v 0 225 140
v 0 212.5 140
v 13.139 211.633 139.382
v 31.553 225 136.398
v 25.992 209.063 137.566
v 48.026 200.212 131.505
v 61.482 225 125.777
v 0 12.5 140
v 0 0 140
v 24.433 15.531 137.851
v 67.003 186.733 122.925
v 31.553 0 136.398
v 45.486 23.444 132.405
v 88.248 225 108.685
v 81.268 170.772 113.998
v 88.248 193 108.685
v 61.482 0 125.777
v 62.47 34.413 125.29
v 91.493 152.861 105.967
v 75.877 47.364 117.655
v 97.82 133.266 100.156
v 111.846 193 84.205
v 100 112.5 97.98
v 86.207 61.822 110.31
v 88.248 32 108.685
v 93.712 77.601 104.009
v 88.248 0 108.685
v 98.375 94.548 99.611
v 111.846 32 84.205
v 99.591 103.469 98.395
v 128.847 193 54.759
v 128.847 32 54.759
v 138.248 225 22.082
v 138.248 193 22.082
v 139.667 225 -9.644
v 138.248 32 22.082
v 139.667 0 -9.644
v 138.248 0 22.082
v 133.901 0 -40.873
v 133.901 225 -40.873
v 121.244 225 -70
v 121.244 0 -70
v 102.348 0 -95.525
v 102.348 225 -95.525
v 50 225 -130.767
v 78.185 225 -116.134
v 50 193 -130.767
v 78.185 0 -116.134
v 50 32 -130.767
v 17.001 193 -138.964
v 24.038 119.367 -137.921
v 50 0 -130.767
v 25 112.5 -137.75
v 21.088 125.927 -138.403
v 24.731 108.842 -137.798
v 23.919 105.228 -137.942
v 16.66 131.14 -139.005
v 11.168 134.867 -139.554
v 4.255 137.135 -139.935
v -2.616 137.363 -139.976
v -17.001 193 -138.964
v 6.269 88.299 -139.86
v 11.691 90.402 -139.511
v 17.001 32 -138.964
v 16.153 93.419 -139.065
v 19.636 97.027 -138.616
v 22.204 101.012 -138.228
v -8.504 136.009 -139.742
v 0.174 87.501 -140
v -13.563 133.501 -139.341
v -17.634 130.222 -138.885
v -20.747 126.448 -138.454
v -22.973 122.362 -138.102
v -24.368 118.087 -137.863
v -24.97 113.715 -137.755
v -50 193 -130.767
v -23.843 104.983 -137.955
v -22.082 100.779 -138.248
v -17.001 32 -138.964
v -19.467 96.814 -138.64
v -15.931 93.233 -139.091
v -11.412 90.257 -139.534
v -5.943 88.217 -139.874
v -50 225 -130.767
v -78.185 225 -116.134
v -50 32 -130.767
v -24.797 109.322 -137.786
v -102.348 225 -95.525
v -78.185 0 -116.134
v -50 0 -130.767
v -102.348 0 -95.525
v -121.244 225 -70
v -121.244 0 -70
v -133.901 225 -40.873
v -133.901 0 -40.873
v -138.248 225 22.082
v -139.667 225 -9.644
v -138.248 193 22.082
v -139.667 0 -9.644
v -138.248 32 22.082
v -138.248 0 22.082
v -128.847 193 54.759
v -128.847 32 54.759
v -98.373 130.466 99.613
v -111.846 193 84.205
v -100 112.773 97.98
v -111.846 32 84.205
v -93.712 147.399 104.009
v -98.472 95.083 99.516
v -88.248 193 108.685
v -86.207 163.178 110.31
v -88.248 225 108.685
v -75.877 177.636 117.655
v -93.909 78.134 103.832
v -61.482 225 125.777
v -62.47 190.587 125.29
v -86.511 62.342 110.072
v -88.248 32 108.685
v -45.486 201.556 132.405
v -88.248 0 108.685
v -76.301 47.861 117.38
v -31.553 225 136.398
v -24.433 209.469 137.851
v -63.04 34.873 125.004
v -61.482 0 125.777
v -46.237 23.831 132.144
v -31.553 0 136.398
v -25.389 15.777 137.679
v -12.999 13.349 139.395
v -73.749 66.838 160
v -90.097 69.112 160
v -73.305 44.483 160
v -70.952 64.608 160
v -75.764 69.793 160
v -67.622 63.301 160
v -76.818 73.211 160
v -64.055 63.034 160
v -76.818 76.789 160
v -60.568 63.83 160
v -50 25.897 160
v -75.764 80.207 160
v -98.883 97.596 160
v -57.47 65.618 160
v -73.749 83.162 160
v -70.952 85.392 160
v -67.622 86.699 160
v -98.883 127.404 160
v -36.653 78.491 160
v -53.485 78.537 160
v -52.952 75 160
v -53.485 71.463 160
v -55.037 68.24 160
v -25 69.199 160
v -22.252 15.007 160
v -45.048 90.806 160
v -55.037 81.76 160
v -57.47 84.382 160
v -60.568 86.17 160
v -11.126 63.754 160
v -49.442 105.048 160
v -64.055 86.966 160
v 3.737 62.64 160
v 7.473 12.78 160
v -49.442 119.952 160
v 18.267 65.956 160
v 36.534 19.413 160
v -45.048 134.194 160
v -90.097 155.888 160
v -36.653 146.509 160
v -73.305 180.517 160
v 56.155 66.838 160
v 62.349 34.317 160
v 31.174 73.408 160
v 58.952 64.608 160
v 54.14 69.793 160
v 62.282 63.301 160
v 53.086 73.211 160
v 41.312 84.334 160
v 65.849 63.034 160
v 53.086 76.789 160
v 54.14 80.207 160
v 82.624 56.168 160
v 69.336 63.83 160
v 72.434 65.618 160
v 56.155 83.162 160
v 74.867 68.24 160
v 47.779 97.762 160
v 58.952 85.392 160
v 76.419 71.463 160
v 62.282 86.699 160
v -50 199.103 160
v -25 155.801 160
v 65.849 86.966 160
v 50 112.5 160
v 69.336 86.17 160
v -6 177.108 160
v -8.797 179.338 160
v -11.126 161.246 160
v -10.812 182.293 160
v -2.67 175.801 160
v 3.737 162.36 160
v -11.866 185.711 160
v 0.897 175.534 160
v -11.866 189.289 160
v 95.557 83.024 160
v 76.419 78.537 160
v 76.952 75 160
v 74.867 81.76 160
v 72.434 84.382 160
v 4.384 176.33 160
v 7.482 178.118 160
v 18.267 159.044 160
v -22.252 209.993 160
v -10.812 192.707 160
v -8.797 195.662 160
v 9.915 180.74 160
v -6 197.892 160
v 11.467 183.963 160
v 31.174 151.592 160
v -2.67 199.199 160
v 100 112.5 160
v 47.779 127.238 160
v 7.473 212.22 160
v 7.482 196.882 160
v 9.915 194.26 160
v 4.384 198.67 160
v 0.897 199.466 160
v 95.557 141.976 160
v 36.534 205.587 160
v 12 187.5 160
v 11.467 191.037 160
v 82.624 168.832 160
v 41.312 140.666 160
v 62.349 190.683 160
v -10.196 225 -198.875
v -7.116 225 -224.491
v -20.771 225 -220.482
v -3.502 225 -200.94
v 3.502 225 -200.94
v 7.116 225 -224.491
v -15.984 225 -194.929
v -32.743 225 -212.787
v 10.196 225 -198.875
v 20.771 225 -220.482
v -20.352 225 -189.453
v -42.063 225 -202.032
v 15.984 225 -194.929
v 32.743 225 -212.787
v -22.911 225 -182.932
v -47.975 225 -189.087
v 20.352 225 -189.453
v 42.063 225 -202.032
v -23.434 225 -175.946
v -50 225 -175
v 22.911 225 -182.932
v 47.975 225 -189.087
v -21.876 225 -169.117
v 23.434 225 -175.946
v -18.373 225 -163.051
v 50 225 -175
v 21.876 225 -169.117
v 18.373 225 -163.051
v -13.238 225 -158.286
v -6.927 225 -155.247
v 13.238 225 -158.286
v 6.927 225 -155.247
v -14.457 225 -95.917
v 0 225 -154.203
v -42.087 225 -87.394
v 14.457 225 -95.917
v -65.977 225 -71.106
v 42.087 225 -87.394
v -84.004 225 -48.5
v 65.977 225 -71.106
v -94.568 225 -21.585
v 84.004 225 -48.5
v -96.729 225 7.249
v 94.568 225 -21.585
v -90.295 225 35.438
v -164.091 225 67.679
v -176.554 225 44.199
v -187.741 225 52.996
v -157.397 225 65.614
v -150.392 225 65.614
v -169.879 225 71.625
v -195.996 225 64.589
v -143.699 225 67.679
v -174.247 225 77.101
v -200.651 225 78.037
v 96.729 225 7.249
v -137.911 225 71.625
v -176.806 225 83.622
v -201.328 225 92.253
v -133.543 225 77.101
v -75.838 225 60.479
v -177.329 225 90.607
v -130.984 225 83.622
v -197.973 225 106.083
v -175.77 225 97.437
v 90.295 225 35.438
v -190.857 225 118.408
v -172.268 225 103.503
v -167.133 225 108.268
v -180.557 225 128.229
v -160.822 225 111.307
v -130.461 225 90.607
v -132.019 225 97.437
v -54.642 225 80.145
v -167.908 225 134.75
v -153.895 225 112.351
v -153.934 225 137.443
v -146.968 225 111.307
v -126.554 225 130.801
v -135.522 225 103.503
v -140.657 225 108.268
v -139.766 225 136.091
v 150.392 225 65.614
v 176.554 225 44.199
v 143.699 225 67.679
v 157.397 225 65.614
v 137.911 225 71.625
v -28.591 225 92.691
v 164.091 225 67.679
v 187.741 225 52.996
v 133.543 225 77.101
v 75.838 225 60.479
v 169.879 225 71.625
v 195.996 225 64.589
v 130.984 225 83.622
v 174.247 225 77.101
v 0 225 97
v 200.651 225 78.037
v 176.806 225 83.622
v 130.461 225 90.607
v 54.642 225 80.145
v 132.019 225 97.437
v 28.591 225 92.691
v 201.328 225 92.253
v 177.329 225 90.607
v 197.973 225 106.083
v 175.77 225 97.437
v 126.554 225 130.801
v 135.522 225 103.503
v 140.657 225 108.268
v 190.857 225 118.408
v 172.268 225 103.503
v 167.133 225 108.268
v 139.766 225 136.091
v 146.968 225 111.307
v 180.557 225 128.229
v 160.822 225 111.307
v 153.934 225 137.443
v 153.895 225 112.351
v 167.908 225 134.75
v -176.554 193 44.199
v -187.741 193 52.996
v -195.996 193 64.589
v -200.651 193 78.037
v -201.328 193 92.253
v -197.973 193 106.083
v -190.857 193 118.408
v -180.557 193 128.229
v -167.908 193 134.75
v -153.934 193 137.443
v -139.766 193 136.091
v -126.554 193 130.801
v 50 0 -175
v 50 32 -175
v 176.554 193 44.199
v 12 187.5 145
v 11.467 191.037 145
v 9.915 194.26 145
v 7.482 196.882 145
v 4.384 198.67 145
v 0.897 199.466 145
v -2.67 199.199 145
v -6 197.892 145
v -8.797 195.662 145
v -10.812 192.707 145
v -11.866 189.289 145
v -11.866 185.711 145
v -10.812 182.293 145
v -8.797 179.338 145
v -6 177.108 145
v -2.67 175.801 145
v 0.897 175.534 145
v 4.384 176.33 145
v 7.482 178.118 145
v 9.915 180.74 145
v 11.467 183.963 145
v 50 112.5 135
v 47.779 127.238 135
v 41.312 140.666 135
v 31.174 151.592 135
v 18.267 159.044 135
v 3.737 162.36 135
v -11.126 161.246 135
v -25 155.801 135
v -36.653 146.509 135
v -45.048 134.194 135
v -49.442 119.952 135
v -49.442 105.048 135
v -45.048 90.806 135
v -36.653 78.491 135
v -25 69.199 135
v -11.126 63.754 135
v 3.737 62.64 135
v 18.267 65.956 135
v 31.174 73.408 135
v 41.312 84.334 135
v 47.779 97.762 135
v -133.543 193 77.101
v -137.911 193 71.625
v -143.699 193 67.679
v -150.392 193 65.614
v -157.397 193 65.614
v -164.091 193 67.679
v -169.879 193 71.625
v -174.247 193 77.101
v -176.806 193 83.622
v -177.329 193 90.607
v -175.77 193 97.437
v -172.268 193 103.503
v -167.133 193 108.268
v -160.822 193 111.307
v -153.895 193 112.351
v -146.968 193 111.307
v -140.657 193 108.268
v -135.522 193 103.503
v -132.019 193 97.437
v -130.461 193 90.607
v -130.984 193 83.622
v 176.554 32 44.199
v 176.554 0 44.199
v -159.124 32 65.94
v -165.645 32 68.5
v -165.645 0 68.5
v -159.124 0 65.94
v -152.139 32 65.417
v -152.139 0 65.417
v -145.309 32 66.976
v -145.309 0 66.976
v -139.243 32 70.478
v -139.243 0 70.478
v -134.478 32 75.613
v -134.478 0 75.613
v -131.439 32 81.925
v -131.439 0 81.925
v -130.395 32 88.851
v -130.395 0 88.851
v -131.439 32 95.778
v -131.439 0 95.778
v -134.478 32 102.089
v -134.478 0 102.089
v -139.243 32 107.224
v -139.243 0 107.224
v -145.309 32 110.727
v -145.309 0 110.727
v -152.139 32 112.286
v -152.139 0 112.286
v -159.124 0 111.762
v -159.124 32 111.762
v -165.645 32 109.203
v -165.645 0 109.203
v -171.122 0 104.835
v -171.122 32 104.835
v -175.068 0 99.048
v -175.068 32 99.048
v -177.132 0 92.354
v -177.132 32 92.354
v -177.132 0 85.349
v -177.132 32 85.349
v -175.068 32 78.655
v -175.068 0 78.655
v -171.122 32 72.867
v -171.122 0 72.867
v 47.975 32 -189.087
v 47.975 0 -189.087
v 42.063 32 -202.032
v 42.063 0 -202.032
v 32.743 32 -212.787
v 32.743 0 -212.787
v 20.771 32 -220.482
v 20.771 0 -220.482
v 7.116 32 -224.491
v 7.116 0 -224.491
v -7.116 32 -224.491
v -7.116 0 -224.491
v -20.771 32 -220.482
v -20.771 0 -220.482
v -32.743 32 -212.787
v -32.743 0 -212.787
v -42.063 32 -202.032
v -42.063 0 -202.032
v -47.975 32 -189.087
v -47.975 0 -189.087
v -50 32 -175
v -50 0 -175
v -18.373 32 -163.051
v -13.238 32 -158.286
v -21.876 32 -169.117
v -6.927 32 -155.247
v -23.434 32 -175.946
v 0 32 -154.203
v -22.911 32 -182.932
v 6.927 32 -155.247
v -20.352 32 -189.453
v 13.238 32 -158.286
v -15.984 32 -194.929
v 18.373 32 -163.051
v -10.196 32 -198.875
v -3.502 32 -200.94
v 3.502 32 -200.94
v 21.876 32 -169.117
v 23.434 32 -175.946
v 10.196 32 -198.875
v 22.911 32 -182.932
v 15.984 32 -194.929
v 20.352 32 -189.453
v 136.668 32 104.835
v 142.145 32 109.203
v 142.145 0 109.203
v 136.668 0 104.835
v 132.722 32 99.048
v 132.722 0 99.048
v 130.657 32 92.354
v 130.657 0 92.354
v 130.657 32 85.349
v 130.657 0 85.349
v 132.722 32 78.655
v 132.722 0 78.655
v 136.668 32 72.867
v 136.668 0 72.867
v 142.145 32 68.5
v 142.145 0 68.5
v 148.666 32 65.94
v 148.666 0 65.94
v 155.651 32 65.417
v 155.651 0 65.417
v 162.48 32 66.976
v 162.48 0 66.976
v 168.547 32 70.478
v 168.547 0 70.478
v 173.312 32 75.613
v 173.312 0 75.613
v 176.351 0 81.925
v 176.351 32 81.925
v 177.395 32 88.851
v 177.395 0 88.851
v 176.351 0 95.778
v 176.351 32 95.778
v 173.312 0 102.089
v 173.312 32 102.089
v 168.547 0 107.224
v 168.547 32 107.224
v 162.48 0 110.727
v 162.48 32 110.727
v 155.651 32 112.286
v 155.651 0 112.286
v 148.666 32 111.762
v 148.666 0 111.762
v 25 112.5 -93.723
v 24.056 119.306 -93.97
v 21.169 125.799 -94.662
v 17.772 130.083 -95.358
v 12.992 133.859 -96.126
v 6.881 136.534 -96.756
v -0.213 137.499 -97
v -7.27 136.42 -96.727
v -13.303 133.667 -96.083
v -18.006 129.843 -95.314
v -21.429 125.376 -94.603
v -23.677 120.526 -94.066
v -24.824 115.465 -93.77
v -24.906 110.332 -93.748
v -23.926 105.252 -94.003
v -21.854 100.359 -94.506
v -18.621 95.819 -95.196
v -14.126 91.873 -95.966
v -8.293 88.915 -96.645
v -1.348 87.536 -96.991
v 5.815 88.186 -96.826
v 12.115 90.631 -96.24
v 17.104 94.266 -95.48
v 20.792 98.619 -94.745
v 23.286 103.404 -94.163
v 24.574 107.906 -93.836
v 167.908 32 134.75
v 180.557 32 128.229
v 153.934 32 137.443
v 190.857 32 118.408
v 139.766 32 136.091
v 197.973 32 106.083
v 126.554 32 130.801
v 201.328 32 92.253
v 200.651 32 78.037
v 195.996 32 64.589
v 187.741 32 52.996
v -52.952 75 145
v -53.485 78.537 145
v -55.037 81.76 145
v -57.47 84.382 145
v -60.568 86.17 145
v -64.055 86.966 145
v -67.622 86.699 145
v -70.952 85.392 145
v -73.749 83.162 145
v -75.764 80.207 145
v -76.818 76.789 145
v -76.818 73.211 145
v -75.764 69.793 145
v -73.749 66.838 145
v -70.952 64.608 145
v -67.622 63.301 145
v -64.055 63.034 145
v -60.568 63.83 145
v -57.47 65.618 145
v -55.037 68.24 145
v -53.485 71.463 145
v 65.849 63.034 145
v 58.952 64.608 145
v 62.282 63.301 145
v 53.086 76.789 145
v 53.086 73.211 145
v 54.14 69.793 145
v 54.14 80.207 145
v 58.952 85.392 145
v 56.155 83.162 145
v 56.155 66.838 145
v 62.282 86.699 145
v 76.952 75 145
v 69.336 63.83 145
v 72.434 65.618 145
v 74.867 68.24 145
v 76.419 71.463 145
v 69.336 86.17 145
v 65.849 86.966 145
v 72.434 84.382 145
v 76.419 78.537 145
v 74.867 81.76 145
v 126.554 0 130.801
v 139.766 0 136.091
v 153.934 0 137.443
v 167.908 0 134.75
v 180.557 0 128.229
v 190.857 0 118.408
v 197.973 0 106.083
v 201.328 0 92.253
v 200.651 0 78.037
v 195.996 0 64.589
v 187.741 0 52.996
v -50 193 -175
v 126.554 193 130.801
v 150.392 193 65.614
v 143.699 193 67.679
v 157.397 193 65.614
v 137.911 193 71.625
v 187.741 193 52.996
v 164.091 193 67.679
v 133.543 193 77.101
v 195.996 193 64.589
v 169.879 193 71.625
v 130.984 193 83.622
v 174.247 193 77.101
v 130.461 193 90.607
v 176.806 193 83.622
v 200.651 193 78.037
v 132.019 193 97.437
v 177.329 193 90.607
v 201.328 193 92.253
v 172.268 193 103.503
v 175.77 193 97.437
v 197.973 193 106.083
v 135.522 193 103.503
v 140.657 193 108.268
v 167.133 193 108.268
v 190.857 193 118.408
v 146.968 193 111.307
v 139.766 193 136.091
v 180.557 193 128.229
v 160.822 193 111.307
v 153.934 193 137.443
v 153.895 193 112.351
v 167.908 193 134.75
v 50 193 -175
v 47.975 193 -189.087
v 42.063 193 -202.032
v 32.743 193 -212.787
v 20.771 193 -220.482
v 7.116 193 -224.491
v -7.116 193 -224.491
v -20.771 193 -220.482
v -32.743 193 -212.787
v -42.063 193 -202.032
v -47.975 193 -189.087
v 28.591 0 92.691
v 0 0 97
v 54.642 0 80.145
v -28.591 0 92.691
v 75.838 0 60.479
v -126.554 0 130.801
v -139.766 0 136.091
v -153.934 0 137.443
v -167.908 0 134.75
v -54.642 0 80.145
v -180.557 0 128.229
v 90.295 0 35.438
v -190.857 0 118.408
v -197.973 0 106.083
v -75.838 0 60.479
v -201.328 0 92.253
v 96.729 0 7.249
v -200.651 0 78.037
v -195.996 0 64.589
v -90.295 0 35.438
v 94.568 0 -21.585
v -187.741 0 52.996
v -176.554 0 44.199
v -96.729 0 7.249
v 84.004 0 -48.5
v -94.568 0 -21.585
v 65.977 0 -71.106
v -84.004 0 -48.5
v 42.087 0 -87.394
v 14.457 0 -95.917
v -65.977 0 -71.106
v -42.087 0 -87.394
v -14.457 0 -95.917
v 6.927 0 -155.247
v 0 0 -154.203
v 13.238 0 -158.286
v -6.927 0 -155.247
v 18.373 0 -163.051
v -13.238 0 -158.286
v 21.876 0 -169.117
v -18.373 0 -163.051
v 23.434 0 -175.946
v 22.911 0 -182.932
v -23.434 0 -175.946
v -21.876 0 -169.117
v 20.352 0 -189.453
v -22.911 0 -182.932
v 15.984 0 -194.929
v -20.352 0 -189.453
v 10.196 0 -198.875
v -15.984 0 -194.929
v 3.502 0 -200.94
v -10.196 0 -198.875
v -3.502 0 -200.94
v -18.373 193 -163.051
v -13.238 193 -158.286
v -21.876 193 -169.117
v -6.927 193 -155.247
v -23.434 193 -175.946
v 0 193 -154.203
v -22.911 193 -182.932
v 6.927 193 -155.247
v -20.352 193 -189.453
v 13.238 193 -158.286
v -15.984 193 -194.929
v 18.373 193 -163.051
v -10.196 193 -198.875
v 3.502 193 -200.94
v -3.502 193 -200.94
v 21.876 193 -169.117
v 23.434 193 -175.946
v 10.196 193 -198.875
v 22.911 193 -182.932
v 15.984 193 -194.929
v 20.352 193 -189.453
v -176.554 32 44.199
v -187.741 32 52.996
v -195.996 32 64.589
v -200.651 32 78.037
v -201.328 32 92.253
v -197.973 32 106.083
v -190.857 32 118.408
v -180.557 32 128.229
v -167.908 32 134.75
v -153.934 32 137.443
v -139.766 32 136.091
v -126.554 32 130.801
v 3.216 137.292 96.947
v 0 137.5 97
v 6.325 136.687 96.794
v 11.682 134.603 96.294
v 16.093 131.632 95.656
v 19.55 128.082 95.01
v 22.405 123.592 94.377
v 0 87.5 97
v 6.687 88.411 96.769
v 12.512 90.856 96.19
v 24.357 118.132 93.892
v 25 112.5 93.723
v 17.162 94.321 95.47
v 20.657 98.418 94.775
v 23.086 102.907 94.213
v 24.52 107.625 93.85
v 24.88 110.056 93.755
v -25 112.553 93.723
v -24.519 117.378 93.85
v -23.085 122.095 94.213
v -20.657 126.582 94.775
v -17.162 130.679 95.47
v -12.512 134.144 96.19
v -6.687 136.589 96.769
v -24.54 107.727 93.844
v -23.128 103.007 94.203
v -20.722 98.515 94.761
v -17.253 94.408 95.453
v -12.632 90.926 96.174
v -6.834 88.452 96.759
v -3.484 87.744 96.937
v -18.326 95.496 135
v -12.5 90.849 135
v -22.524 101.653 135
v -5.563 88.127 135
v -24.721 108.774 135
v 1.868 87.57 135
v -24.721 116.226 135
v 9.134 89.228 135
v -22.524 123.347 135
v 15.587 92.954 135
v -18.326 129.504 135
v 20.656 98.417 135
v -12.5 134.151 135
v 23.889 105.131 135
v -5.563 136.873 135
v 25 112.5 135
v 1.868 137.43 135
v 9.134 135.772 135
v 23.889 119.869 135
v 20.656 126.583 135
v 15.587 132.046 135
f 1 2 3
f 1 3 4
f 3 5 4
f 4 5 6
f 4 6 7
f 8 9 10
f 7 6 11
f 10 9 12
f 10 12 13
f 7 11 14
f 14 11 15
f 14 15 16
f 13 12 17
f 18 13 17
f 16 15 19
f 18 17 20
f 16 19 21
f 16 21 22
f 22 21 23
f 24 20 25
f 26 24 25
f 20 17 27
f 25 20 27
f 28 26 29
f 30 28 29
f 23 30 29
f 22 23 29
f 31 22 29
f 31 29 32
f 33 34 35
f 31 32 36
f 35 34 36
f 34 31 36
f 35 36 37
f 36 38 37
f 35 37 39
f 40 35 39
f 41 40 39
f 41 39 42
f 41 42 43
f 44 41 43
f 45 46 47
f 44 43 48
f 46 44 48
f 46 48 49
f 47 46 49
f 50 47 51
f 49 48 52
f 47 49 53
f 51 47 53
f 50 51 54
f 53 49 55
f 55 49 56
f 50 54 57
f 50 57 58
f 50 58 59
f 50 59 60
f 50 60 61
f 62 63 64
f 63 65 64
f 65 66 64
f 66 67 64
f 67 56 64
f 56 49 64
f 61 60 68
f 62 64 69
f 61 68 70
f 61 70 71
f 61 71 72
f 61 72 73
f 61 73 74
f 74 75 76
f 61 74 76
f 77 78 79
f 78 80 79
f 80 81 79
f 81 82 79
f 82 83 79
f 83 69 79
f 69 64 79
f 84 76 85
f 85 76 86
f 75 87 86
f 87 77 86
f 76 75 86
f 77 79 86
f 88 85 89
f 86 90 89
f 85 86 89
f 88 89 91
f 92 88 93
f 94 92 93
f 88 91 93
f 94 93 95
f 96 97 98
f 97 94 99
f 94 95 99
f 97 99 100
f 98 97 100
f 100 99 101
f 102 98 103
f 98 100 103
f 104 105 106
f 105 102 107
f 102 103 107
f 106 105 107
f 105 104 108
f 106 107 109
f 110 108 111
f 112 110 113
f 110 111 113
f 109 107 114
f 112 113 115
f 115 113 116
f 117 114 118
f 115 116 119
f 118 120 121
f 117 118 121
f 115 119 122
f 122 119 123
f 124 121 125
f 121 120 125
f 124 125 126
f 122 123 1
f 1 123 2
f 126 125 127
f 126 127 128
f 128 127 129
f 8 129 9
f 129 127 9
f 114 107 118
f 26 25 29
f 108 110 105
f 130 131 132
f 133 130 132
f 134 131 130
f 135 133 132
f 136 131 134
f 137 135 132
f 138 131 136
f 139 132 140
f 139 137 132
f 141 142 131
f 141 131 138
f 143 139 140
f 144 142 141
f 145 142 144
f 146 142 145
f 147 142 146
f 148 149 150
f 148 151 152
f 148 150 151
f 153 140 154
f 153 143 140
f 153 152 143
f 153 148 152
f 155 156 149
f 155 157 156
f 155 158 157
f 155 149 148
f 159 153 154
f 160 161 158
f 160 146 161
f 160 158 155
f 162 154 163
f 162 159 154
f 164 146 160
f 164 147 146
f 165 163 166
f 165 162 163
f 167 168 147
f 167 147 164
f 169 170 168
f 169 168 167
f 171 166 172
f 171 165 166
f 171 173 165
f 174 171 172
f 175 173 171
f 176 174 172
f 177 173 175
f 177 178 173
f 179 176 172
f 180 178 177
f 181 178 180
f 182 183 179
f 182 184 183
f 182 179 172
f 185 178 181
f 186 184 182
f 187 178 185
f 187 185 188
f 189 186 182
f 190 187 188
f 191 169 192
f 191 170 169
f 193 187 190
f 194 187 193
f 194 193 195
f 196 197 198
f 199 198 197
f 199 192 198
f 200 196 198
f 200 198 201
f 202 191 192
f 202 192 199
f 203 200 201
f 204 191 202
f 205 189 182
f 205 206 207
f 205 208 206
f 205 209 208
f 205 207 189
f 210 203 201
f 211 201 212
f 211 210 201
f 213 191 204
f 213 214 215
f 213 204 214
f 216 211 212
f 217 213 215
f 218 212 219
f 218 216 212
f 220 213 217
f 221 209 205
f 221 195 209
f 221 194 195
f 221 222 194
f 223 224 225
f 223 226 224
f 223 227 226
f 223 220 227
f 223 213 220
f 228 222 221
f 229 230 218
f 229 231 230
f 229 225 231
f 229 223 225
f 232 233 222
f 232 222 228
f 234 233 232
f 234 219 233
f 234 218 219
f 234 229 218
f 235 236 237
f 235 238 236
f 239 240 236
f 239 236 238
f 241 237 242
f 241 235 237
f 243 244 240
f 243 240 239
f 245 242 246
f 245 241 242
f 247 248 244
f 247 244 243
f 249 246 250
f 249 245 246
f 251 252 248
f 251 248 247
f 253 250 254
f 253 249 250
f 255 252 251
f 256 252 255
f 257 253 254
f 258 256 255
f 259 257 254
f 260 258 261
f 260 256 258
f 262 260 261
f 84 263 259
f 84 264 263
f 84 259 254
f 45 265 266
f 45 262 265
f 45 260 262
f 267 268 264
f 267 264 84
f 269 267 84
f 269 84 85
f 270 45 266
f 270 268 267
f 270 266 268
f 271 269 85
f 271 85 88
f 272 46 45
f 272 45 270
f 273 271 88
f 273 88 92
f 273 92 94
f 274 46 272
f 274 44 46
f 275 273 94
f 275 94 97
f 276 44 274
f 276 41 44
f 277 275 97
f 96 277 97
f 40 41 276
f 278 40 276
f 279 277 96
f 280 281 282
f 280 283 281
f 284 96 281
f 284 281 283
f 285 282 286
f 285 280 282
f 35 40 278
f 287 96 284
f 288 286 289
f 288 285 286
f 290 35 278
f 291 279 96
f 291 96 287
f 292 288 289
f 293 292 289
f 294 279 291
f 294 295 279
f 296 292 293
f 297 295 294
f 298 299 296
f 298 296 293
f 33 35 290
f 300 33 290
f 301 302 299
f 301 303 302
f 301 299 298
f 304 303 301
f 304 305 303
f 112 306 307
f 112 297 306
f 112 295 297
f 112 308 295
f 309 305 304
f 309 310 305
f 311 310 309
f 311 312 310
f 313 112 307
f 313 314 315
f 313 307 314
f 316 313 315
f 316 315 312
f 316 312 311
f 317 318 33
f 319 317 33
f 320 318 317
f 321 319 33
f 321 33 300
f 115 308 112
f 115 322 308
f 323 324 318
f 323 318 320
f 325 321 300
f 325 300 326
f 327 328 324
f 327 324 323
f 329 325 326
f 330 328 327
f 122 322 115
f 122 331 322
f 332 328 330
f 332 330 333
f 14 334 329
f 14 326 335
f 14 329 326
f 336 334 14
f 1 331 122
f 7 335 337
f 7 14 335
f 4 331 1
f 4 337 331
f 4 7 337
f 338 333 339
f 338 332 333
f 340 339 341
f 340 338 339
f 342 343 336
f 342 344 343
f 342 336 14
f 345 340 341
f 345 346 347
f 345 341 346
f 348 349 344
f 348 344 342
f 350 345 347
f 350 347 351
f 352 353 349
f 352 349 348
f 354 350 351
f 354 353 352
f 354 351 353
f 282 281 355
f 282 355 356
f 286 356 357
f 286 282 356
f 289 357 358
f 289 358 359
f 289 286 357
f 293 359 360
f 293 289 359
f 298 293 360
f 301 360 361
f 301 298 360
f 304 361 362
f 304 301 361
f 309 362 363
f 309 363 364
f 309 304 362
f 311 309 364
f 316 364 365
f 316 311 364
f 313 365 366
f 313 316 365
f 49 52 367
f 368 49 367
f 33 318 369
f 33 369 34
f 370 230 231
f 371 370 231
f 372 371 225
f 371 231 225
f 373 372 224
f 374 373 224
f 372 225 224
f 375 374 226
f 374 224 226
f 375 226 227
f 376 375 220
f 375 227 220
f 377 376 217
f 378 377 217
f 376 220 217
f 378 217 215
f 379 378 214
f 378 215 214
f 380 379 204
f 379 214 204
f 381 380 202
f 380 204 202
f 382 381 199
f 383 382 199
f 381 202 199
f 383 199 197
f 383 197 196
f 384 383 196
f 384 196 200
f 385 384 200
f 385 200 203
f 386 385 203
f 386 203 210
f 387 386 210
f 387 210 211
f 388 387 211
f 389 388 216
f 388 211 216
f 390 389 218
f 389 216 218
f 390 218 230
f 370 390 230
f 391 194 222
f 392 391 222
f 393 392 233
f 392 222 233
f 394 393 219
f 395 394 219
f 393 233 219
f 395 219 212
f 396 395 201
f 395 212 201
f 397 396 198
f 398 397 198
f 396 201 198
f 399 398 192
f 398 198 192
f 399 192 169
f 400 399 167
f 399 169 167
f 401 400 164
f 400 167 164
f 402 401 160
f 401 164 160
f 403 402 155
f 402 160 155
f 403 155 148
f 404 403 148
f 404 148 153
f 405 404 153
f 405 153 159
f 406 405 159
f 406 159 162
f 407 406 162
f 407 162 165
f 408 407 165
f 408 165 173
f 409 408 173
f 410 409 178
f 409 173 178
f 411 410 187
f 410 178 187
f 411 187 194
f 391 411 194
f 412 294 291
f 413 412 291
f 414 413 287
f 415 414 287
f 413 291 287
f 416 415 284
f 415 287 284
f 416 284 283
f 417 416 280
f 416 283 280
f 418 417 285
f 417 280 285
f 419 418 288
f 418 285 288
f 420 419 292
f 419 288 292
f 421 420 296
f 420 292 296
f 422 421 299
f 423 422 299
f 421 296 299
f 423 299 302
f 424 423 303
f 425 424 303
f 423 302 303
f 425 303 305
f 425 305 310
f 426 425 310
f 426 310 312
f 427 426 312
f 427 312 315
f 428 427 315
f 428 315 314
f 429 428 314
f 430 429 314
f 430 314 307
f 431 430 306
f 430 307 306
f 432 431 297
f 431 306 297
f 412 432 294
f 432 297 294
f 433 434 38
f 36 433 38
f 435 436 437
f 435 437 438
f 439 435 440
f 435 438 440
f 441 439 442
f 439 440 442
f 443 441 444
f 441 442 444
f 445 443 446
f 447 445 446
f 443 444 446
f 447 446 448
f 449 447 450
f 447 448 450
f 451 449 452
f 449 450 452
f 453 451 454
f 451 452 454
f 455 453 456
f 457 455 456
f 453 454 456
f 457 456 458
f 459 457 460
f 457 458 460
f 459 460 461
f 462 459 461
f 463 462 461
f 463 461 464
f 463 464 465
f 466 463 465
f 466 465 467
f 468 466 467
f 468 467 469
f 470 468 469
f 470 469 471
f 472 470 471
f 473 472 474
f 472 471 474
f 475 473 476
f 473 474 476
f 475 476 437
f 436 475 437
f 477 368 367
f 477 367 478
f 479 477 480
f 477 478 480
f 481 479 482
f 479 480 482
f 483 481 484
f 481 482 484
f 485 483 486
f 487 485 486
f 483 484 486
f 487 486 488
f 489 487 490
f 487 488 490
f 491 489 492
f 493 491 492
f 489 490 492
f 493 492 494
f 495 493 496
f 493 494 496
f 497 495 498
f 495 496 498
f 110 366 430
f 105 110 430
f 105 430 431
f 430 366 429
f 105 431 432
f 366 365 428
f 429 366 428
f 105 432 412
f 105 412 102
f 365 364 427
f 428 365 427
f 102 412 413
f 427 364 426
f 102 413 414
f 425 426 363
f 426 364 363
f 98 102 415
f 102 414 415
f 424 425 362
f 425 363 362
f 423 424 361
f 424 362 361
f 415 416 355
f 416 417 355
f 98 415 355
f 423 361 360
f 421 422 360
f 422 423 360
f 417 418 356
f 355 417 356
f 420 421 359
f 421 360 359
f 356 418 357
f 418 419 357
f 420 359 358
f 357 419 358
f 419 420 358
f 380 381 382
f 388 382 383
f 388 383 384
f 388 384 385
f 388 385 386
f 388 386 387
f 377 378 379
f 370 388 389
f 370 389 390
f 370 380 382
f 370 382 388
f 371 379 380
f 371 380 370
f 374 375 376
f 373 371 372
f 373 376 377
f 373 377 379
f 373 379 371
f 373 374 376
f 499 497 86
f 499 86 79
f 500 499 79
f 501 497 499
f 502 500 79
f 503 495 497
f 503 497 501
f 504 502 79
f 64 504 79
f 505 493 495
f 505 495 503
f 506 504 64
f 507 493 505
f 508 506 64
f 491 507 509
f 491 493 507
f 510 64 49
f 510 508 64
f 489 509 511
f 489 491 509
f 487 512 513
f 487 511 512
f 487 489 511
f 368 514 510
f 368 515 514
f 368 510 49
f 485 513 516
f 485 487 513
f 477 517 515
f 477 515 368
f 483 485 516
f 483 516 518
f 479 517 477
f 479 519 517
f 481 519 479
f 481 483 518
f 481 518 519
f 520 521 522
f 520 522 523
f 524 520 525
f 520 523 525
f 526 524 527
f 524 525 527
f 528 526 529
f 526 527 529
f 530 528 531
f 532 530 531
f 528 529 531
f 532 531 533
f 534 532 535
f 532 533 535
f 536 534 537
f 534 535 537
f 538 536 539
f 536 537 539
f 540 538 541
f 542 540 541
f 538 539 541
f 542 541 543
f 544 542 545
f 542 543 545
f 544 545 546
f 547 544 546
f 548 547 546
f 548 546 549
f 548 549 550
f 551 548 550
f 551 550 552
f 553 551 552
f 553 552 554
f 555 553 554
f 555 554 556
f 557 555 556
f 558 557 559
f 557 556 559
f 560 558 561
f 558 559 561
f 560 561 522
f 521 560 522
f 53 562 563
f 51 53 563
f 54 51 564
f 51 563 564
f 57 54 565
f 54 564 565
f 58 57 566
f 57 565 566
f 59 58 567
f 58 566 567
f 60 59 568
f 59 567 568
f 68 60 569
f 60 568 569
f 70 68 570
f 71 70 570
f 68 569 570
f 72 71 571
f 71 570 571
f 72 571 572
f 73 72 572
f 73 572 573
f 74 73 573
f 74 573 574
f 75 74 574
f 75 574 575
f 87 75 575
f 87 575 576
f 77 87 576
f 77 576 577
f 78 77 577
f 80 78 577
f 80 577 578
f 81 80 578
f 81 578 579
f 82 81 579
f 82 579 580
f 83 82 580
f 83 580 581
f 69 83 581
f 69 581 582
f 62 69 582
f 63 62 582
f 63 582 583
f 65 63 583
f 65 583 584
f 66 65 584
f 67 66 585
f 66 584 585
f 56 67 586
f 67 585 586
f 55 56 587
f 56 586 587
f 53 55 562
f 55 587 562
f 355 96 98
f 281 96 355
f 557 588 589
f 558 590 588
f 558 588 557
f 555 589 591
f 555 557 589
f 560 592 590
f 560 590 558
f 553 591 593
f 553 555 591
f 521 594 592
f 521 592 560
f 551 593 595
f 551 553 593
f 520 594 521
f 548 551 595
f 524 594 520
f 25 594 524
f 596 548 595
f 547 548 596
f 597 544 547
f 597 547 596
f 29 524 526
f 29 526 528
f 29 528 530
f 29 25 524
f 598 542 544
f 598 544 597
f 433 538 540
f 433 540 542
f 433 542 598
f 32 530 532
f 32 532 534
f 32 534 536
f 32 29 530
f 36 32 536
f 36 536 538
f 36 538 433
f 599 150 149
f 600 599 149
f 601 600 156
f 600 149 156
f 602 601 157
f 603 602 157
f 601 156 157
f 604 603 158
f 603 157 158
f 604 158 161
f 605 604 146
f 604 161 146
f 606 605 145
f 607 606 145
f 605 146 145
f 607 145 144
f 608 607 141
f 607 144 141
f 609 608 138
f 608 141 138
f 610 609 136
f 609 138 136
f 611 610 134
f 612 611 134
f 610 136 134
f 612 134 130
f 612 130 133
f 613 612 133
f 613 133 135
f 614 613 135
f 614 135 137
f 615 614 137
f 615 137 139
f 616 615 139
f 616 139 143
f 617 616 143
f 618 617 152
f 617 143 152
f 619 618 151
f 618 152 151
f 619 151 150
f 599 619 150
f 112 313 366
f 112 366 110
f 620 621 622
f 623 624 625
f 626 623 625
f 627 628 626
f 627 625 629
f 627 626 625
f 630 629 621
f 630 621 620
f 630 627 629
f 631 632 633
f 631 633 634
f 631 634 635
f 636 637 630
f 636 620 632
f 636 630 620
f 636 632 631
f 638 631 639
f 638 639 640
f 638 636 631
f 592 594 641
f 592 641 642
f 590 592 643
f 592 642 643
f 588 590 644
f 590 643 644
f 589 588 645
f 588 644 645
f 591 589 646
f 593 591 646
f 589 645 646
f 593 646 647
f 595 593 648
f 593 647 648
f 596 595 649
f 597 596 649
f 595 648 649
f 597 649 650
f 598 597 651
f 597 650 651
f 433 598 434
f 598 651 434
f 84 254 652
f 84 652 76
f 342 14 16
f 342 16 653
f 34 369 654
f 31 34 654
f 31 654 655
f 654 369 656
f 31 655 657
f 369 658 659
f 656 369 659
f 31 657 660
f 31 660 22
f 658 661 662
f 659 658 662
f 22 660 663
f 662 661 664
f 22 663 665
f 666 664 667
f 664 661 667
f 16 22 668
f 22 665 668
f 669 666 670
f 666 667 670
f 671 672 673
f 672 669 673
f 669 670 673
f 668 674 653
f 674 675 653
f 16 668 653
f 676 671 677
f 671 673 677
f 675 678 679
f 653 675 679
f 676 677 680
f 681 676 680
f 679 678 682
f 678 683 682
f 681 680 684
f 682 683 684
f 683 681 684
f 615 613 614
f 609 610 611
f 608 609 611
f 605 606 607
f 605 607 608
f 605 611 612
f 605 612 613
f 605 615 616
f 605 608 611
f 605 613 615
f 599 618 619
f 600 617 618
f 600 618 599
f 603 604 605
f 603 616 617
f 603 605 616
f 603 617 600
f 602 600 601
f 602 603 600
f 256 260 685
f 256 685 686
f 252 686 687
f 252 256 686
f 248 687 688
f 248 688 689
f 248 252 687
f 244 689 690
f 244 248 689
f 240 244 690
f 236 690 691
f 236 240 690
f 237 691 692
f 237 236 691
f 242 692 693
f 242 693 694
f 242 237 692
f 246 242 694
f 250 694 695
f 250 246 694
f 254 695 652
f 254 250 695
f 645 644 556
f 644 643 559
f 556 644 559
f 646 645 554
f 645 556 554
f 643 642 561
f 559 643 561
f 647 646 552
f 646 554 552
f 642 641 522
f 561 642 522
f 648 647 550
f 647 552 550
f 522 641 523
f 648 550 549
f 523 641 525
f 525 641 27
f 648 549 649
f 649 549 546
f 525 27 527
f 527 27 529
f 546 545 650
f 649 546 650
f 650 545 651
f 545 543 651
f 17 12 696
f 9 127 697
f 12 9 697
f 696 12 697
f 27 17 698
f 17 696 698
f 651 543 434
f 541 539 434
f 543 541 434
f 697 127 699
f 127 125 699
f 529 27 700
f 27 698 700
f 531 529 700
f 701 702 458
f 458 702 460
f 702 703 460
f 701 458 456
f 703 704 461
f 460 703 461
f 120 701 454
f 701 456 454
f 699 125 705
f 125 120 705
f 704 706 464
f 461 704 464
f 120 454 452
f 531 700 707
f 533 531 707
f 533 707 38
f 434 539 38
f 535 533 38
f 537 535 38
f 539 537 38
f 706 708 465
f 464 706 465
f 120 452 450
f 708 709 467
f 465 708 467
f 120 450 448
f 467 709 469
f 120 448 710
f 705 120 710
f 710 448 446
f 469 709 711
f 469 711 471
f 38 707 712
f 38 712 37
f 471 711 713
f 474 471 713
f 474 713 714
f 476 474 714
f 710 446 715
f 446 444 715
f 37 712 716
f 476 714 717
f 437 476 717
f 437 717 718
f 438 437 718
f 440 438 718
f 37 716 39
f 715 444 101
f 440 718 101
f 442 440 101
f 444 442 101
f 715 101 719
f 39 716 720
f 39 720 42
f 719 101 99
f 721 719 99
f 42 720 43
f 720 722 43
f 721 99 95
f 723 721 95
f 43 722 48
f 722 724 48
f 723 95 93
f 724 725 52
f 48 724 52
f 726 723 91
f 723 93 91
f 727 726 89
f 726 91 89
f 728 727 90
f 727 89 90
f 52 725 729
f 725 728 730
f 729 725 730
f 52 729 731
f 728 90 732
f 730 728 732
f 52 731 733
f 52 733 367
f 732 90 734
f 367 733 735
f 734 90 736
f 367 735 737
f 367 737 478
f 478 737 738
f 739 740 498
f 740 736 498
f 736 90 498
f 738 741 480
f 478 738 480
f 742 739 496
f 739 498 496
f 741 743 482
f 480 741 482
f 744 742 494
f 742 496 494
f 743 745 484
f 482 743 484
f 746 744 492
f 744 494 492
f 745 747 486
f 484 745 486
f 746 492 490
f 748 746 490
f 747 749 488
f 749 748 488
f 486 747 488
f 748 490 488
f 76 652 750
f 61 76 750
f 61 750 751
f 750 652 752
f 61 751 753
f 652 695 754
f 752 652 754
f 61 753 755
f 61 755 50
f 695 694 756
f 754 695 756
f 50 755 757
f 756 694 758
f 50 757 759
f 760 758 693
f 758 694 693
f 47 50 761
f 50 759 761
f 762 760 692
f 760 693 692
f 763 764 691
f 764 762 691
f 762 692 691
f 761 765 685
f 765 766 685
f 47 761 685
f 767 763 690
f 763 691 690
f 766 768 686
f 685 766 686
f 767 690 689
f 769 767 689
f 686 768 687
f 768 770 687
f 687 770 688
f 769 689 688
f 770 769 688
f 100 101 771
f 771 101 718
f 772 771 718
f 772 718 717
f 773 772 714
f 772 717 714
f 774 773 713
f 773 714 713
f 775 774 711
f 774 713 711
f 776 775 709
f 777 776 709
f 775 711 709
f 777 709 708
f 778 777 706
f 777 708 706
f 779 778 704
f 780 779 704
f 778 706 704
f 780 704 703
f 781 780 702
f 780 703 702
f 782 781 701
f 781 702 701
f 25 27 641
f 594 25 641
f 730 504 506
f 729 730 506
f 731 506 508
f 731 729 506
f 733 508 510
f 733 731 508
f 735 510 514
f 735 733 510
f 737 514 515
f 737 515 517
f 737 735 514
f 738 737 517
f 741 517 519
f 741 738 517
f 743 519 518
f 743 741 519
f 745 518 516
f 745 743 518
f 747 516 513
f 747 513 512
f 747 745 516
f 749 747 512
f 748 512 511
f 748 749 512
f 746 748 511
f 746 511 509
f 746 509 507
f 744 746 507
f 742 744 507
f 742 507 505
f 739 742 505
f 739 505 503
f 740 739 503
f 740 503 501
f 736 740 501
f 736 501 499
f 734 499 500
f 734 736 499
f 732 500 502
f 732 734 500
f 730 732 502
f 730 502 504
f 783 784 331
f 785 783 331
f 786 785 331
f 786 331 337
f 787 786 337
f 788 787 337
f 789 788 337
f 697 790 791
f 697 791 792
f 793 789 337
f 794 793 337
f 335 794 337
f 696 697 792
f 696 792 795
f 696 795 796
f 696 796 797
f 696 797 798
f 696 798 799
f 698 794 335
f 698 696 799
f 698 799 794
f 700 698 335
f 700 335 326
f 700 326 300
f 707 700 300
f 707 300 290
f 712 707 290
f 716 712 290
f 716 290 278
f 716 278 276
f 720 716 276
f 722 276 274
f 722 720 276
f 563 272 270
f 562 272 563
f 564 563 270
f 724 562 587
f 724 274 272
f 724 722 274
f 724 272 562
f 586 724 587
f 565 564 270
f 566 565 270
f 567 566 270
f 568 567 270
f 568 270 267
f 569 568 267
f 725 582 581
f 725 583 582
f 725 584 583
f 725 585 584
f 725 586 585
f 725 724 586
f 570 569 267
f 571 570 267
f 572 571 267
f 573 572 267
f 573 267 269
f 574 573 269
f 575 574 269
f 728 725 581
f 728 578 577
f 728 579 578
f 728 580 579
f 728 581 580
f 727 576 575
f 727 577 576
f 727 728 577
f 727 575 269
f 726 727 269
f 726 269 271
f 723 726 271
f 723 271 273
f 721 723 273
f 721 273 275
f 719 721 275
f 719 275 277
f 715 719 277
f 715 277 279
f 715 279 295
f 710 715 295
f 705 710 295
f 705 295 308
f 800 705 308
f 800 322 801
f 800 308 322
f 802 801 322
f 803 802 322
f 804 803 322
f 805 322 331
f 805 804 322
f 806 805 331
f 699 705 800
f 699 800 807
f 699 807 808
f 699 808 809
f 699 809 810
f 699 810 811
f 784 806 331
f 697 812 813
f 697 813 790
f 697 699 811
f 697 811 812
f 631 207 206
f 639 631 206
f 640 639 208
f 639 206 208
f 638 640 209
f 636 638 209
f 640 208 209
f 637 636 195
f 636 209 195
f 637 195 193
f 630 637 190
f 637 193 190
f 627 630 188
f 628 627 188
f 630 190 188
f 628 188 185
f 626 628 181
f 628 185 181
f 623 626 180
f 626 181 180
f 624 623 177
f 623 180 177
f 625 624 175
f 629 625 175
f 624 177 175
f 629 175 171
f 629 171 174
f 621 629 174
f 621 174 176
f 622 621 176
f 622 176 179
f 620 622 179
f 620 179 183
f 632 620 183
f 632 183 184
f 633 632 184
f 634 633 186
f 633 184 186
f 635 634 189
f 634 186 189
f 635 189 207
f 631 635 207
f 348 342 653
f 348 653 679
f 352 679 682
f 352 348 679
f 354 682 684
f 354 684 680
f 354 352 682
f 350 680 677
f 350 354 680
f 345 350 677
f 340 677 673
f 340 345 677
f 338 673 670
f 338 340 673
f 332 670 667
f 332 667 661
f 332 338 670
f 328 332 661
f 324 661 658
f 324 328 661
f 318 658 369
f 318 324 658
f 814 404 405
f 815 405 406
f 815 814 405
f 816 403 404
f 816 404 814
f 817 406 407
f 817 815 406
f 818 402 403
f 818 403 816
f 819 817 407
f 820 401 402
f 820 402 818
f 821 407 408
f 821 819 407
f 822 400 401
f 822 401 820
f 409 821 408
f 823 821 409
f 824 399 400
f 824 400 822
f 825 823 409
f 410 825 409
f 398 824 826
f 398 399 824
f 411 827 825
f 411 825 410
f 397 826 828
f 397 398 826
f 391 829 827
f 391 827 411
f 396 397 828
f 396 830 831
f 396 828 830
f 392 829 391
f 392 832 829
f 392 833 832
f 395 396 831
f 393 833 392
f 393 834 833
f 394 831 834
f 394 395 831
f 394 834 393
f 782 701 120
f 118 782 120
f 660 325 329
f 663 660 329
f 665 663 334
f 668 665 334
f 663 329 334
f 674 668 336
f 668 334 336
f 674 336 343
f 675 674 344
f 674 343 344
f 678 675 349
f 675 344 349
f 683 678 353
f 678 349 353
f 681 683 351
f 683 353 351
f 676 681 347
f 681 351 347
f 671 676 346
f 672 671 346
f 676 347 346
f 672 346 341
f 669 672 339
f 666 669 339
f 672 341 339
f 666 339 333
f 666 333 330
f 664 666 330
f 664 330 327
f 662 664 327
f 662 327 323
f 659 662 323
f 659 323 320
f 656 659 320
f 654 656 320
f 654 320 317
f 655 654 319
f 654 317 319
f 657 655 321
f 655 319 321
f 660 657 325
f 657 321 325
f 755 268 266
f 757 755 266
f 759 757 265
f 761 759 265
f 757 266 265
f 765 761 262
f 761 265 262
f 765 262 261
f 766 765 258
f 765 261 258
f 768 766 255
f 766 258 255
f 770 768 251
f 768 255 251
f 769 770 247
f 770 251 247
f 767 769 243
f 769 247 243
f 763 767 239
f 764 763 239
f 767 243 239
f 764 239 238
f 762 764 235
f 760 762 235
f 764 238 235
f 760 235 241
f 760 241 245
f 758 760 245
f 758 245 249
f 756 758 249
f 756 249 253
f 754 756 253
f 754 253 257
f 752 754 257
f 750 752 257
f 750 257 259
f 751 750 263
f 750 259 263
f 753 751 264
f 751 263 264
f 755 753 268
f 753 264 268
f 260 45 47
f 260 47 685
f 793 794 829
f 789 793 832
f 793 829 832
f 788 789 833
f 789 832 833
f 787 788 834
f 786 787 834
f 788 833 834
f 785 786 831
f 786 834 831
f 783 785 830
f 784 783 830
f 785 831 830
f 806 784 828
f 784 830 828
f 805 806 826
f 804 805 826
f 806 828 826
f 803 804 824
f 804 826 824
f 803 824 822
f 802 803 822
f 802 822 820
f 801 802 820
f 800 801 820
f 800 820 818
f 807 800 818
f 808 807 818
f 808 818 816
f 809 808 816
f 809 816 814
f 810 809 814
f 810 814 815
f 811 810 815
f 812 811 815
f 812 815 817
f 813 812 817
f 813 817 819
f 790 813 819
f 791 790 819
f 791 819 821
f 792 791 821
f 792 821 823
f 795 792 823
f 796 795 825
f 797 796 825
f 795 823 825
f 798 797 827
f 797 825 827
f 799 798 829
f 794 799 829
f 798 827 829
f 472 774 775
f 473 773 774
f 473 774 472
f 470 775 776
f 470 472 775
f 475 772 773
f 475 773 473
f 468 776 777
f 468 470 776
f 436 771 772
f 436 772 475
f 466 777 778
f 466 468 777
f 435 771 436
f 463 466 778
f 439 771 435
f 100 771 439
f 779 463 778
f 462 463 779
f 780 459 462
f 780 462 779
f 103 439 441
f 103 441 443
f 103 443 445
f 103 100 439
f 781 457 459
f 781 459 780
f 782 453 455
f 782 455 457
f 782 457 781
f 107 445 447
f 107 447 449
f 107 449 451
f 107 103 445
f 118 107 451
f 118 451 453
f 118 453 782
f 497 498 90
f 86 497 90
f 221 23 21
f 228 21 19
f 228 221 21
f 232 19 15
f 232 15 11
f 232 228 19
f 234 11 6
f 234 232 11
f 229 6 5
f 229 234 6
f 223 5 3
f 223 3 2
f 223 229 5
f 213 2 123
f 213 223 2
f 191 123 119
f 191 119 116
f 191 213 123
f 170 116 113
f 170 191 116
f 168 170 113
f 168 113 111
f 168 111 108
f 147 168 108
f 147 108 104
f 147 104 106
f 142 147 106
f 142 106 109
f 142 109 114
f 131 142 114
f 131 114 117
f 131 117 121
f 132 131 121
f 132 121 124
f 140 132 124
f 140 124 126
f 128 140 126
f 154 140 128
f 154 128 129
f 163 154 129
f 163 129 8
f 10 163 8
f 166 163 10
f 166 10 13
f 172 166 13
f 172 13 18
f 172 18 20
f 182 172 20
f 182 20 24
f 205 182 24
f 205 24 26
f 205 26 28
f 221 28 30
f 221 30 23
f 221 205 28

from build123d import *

# Parameters (mm, degrees)
SKETCH1_R                = 140
SKETCH1_R_2              = 97
BOSS_EXTRUDE1_DEPTH      = 225
SKETCH3_R                = 23.5
BOSS_EXTRUDE3_DEPTH      = 32
CIRPATTERN1_COUNT        = 3
MIRROR1_COPY_1_SKETCH_R  = 23.5
MIRROR1_COPY_1_DEPTH     = 32
MIRROR1_COPY_2_SKETCH_R  = 23.5
MIRROR1_COPY_2_DEPTH     = 32
BOSS_EXTRUDE4_REACH      = 491.361
BOSS_EXTRUDE4_END_RADIUS = 140
SKETCH4_R                = 100
SKETCH5_R                = 50
CUT_EXTRUDE1_DEPTH       = 25
SKETCH6_R                = 25
CUT_EXTRUDE2_DEPTH       = 490.361006427
SKETCH7_R                = 12
CUT_EXTRUDE3_DEPTH       = 15


with BuildPart() as part:
    # Sketch1 → Boss-Extrude1 (new body)
    with BuildSketch(Plane(origin=(0, 0, 0), x_dir=(1, 0, 0), z_dir=(0, 1, 0))):
        with Locations(Location((0, 0, 0), (0, 0, 270))):
            Circle(SKETCH1_R)
        with Locations(Location((0, 0, 0), (0, 0, 270))):
            Circle(SKETCH1_R_2, mode=Mode.SUBTRACT)
    extrude(amount=BOSS_EXTRUDE1_DEPTH)

    # Sketch3 → Boss-Extrude3 (add)
    with BuildSketch(Plane(origin=(0, 225, 0), x_dir=(1, 0, 0), z_dir=(0, 1, 0))):
        with BuildLine():
            Line((-50, 175), (-50, 101.528699727))
            Line((-50, 101.528699727), (50, 101.528699727))
            Line((50, 101.528699727), (50, 175))
            ThreePointArc((50, 175), (0, 225), (-50, 175))
        make_face()
        with Locations(Location((0, 177.702584928, 0), (0, 0, 270))):
            Circle(SKETCH3_R, mode=Mode.SUBTRACT)
    boss_extrude3 = extrude(amount=-BOSS_EXTRUDE3_DEPTH)

    # CirPattern1: Boss-Extrude3 ×3 about axis
    cirpattern1_axis = Axis((0, 0, 0), (0, 1, 0))
    for i in range(1, CIRPATTERN1_COUNT):
        add(boss_extrude3.rotate(cirpattern1_axis, i * 360 / CIRPATTERN1_COUNT))

    # Mirror1: Boss-Extrude3 across plane
    add(boss_extrude3.mirror(Plane.ZX.offset(112.5)))

    # Mirror1 copy 1 sketch → Mirror1 copy 1 (add)
    with BuildSketch(Plane(origin=(0, 0, 0), x_dir=(-0.4999999999999998, 0, -0.8660254037844387), z_dir=(0, -1, 0))):
        with BuildLine():
            Line((-50, -175), (-50, -101.528699727))
            Line((-50, -101.528699727), (50, -101.528699727))
            Line((50, -101.528699727), (50, -175))
            ThreePointArc((50, -175), (0, -225), (-50, -175))
        make_face()
        with Locations((0, -177.702584928)):
            Circle(MIRROR1_COPY_1_SKETCH_R, mode=Mode.SUBTRACT)
    extrude(amount=-MIRROR1_COPY_1_DEPTH)

    # Mirror1 copy 2 sketch → Mirror1 copy 2 (add)
    with BuildSketch(Plane(origin=(0, 0, 0), x_dir=(-0.5000000000000004, 0, 0.8660254037844384), z_dir=(0, -1, 0))):
        with BuildLine():
            Line((-50, -175), (-50, -101.528699727))
            Line((-50, -101.528699727), (50, -101.528699727))
            Line((50, -101.528699727), (50, -175))
            ThreePointArc((50, -175), (0, -225), (-50, -175))
        make_face()
        with Locations((0, -177.702584928)):
            Circle(MIRROR1_COPY_2_SKETCH_R, mode=Mode.SUBTRACT)
    extrude(amount=-MIRROR1_COPY_2_DEPTH)

    # Boss-Extrude4: up to this cylinder (the profile starts outside it)
    boss_extrude4_end = Plane(origin=(0, 112.5, 0), z_dir=(0, -1, 0)) * Cylinder(BOSS_EXTRUDE4_END_RADIUS, 1263.722, mode=Mode.PRIVATE)
    # Sketch4 → Boss-Extrude4 (add, up to the surface)
    with BuildSketch(Plane.XY.offset(160), mode=Mode.PRIVATE) as boss_extrude4_sk1:
        with Locations((0, 112.5)):
            Circle(SKETCH4_R)
    boss_extrude4_tool1 = extrude(boss_extrude4_sk1.sketch, amount=-BOSS_EXTRUDE4_REACH, mode=Mode.PRIVATE) - boss_extrude4_end
    add(boss_extrude4_tool1.solids().sort_by_distance((0, 112.5, 160))[0])

    # Sketch5 → Cut-Extrude1 (cut)
    with BuildSketch(Plane.XY.offset(160)):
        with Locations((0, 112.5)):
            Circle(SKETCH5_R)
    extrude(amount=-CUT_EXTRUDE1_DEPTH, mode=Mode.SUBTRACT)

    # Sketch6 → Cut-Extrude2 (cut, through all)
    with BuildSketch(Plane.XY.offset(160)):
        with Locations((0, 112.5)):
            Circle(SKETCH6_R)
    extrude(amount=-CUT_EXTRUDE2_DEPTH, mode=Mode.SUBTRACT)

    # Sketch7 → Cut-Extrude3 (cut)
    with BuildSketch(Plane.XY.offset(160)):
        with Locations((0, 187.5)):
            Circle(SKETCH7_R)
        with Locations((64.951905284, 75)):
            Circle(SKETCH7_R)
        with Locations((-64.951905284, 75)):
            Circle(SKETCH7_R)
    extrude(amount=-CUT_EXTRUDE3_DEPTH, mode=Mode.SUBTRACT)


solid = part.part
